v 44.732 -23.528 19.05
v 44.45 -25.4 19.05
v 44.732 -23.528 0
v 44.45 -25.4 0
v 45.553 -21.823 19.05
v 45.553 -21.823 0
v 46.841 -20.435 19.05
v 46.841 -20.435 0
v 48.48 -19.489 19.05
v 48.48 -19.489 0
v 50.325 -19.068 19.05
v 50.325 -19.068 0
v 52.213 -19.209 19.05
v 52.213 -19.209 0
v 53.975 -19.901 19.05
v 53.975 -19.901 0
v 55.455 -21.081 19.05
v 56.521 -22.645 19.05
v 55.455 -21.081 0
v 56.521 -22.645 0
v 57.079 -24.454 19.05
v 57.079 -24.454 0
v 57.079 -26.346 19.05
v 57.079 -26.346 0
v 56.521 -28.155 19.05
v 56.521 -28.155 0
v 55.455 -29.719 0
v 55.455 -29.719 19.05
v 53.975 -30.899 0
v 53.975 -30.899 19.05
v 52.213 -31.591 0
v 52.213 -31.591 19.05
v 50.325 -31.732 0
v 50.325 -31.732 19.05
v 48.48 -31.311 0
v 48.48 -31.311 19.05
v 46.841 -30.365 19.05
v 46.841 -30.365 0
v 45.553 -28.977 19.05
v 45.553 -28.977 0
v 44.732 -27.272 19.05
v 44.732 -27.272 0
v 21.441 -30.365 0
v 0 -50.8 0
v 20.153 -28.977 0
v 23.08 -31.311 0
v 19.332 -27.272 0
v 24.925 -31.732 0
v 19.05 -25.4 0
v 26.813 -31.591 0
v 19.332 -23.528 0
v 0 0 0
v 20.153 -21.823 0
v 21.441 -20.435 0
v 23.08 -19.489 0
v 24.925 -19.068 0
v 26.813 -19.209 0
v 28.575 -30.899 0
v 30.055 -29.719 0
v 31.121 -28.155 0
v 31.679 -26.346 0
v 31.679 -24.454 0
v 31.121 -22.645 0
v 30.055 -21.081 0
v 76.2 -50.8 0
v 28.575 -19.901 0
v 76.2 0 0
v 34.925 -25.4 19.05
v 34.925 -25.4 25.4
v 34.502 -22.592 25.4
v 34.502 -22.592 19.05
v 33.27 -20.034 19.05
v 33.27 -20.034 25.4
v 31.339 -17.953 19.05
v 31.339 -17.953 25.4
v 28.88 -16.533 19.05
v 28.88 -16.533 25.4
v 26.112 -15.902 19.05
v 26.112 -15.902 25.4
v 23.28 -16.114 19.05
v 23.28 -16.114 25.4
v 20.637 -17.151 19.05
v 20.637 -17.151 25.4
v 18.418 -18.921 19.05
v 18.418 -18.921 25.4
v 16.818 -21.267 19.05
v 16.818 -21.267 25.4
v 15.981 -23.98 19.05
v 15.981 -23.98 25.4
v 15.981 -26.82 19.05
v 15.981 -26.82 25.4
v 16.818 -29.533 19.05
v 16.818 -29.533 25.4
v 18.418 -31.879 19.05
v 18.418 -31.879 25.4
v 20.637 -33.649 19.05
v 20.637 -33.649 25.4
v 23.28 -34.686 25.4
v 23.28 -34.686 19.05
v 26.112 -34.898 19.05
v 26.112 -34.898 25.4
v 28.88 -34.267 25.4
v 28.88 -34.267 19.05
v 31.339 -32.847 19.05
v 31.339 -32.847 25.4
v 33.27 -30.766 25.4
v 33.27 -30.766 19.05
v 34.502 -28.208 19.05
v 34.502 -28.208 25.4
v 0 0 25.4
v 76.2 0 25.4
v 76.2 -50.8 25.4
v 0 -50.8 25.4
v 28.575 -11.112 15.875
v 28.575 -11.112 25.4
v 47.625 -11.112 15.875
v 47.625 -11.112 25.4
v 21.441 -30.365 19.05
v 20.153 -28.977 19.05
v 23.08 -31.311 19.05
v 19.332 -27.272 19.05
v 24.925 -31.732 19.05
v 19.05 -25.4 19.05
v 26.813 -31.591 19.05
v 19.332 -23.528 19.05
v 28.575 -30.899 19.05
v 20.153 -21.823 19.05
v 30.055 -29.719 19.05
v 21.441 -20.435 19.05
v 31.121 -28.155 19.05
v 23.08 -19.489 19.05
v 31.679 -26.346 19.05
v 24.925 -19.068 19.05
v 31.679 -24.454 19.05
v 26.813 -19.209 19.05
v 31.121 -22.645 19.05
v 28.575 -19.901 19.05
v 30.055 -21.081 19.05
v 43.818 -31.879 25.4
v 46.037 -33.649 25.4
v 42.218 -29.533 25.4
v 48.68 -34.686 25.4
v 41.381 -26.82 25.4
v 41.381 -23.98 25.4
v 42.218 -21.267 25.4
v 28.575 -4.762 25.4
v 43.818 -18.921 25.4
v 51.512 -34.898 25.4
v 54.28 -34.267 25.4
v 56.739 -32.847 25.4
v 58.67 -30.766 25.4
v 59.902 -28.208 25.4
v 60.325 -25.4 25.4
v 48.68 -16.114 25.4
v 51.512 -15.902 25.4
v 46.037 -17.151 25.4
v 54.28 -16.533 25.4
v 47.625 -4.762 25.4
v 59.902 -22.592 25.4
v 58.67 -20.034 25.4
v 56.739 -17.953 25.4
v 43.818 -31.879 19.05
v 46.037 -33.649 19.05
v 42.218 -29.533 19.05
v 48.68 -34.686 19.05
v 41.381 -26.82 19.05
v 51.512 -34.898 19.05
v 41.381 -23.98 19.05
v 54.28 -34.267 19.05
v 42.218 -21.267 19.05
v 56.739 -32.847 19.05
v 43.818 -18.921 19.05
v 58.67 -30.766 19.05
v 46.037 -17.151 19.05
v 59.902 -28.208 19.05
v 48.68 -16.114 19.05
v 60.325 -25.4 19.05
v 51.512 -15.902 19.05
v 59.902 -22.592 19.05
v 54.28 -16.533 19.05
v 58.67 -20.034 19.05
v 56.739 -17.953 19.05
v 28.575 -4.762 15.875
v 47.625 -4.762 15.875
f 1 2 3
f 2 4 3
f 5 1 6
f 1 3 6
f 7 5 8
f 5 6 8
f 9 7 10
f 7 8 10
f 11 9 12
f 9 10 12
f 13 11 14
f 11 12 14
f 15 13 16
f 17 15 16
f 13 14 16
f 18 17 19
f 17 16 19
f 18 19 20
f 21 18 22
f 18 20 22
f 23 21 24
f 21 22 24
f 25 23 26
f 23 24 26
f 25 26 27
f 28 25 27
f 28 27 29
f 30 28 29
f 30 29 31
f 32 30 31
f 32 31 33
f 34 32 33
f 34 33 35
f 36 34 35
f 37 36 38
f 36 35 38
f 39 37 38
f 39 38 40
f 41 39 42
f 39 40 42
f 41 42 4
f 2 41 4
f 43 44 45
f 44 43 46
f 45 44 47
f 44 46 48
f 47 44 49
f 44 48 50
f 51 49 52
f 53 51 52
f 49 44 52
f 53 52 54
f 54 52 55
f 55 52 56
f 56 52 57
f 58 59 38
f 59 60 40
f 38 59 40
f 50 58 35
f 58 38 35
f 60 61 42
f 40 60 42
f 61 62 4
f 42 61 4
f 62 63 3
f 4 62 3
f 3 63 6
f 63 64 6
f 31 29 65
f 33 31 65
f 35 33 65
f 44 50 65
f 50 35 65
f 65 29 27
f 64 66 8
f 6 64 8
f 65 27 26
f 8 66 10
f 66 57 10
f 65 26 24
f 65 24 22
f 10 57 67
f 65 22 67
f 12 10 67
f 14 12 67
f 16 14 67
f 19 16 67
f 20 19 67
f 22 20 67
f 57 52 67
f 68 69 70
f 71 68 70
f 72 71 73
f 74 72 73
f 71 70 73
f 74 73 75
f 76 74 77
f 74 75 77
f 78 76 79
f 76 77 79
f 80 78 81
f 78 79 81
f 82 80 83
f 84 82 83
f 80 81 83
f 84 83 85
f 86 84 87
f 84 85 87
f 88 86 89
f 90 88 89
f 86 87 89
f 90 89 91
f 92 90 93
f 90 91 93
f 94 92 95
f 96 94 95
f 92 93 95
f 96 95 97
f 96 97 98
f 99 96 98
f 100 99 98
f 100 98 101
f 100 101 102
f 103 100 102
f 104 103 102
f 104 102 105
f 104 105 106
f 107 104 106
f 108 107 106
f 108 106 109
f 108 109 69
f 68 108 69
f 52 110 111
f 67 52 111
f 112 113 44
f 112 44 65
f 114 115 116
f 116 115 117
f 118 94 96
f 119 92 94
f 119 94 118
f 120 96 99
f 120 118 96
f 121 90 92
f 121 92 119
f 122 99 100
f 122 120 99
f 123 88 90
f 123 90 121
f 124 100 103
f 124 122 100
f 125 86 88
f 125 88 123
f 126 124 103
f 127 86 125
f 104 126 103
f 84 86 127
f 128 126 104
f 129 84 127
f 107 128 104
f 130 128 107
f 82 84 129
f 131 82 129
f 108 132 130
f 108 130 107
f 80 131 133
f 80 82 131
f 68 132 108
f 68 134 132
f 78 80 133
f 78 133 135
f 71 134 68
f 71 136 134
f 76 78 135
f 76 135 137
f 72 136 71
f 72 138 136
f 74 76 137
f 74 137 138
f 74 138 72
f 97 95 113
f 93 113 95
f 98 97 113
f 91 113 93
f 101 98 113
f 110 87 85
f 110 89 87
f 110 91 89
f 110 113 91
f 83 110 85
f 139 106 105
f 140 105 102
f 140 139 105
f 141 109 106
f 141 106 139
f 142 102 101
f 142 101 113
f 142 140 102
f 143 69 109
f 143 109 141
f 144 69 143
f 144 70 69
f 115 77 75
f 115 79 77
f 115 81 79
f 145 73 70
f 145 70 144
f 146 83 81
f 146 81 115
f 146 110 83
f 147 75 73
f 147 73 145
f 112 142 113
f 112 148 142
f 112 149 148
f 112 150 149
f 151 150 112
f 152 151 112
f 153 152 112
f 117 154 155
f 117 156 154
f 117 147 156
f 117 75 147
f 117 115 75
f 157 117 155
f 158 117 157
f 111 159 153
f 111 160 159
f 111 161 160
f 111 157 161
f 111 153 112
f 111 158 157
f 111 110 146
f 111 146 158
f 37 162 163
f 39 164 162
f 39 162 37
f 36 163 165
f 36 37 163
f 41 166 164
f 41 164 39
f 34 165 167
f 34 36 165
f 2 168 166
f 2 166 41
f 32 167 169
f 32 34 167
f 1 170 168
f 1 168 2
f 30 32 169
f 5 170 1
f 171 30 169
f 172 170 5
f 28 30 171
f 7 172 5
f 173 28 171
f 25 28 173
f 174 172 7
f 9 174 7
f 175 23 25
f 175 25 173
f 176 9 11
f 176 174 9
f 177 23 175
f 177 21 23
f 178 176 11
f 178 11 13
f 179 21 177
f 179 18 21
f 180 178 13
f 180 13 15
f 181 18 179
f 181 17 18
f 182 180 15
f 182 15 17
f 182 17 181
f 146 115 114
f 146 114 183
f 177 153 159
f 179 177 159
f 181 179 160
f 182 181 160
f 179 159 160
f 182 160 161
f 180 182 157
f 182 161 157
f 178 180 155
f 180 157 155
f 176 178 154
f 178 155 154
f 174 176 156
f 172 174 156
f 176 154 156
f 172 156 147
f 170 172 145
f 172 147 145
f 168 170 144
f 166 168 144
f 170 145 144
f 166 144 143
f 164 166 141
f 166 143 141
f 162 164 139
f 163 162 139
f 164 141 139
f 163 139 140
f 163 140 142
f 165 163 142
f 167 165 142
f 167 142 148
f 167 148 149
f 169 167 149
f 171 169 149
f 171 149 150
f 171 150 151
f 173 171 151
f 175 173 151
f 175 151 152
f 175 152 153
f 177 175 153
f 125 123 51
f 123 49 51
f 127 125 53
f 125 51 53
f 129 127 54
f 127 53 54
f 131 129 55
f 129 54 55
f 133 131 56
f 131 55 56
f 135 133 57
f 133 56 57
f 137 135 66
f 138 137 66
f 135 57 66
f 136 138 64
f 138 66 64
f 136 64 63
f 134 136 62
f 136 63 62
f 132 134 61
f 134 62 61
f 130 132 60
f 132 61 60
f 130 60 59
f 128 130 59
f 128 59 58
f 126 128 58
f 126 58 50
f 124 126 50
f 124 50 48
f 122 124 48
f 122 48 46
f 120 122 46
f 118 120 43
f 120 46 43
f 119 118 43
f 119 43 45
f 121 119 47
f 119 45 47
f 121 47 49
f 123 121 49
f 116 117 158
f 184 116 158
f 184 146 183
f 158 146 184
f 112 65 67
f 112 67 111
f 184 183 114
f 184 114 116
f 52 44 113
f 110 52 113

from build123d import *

# Parameters (mm, degrees)
F0_W           = 76.2
F0_H           = 25.4
F1_DEPTH       = 50.8
F3_D           = 12.7
F3_CBORE_D     = 19.05
F3_CBORE_DEPTH = 6.35
F4_W           = 19.05
F4_H           = 6.35
F5_DEPTH       = 9.525


with BuildPart() as f1:
    # F0 (on Front) → F1 (new body)
    with BuildSketch(Plane.XZ):
        with Locations((38.1, 12.7)):
            Rectangle(F0_W, F0_H)
    extrude(amount=F1_DEPTH)

    # F3 (through all)
    with Locations(Plane.XY.offset(25.4)):
        with Locations((25.4, -25.4), (50.8, -25.4)):
            CounterBoreHole(F3_D / 2, F3_CBORE_D / 2, F3_CBORE_DEPTH)

    # F4 (on face) → F5 (cut)
    with BuildSketch(Plane.XY.offset(25.4)):
        with Locations((38.1, -7.9375)):
            Rectangle(F4_W, F4_H)
    extrude(amount=-F5_DEPTH, mode=Mode.SUBTRACT)


solid = f1.part
